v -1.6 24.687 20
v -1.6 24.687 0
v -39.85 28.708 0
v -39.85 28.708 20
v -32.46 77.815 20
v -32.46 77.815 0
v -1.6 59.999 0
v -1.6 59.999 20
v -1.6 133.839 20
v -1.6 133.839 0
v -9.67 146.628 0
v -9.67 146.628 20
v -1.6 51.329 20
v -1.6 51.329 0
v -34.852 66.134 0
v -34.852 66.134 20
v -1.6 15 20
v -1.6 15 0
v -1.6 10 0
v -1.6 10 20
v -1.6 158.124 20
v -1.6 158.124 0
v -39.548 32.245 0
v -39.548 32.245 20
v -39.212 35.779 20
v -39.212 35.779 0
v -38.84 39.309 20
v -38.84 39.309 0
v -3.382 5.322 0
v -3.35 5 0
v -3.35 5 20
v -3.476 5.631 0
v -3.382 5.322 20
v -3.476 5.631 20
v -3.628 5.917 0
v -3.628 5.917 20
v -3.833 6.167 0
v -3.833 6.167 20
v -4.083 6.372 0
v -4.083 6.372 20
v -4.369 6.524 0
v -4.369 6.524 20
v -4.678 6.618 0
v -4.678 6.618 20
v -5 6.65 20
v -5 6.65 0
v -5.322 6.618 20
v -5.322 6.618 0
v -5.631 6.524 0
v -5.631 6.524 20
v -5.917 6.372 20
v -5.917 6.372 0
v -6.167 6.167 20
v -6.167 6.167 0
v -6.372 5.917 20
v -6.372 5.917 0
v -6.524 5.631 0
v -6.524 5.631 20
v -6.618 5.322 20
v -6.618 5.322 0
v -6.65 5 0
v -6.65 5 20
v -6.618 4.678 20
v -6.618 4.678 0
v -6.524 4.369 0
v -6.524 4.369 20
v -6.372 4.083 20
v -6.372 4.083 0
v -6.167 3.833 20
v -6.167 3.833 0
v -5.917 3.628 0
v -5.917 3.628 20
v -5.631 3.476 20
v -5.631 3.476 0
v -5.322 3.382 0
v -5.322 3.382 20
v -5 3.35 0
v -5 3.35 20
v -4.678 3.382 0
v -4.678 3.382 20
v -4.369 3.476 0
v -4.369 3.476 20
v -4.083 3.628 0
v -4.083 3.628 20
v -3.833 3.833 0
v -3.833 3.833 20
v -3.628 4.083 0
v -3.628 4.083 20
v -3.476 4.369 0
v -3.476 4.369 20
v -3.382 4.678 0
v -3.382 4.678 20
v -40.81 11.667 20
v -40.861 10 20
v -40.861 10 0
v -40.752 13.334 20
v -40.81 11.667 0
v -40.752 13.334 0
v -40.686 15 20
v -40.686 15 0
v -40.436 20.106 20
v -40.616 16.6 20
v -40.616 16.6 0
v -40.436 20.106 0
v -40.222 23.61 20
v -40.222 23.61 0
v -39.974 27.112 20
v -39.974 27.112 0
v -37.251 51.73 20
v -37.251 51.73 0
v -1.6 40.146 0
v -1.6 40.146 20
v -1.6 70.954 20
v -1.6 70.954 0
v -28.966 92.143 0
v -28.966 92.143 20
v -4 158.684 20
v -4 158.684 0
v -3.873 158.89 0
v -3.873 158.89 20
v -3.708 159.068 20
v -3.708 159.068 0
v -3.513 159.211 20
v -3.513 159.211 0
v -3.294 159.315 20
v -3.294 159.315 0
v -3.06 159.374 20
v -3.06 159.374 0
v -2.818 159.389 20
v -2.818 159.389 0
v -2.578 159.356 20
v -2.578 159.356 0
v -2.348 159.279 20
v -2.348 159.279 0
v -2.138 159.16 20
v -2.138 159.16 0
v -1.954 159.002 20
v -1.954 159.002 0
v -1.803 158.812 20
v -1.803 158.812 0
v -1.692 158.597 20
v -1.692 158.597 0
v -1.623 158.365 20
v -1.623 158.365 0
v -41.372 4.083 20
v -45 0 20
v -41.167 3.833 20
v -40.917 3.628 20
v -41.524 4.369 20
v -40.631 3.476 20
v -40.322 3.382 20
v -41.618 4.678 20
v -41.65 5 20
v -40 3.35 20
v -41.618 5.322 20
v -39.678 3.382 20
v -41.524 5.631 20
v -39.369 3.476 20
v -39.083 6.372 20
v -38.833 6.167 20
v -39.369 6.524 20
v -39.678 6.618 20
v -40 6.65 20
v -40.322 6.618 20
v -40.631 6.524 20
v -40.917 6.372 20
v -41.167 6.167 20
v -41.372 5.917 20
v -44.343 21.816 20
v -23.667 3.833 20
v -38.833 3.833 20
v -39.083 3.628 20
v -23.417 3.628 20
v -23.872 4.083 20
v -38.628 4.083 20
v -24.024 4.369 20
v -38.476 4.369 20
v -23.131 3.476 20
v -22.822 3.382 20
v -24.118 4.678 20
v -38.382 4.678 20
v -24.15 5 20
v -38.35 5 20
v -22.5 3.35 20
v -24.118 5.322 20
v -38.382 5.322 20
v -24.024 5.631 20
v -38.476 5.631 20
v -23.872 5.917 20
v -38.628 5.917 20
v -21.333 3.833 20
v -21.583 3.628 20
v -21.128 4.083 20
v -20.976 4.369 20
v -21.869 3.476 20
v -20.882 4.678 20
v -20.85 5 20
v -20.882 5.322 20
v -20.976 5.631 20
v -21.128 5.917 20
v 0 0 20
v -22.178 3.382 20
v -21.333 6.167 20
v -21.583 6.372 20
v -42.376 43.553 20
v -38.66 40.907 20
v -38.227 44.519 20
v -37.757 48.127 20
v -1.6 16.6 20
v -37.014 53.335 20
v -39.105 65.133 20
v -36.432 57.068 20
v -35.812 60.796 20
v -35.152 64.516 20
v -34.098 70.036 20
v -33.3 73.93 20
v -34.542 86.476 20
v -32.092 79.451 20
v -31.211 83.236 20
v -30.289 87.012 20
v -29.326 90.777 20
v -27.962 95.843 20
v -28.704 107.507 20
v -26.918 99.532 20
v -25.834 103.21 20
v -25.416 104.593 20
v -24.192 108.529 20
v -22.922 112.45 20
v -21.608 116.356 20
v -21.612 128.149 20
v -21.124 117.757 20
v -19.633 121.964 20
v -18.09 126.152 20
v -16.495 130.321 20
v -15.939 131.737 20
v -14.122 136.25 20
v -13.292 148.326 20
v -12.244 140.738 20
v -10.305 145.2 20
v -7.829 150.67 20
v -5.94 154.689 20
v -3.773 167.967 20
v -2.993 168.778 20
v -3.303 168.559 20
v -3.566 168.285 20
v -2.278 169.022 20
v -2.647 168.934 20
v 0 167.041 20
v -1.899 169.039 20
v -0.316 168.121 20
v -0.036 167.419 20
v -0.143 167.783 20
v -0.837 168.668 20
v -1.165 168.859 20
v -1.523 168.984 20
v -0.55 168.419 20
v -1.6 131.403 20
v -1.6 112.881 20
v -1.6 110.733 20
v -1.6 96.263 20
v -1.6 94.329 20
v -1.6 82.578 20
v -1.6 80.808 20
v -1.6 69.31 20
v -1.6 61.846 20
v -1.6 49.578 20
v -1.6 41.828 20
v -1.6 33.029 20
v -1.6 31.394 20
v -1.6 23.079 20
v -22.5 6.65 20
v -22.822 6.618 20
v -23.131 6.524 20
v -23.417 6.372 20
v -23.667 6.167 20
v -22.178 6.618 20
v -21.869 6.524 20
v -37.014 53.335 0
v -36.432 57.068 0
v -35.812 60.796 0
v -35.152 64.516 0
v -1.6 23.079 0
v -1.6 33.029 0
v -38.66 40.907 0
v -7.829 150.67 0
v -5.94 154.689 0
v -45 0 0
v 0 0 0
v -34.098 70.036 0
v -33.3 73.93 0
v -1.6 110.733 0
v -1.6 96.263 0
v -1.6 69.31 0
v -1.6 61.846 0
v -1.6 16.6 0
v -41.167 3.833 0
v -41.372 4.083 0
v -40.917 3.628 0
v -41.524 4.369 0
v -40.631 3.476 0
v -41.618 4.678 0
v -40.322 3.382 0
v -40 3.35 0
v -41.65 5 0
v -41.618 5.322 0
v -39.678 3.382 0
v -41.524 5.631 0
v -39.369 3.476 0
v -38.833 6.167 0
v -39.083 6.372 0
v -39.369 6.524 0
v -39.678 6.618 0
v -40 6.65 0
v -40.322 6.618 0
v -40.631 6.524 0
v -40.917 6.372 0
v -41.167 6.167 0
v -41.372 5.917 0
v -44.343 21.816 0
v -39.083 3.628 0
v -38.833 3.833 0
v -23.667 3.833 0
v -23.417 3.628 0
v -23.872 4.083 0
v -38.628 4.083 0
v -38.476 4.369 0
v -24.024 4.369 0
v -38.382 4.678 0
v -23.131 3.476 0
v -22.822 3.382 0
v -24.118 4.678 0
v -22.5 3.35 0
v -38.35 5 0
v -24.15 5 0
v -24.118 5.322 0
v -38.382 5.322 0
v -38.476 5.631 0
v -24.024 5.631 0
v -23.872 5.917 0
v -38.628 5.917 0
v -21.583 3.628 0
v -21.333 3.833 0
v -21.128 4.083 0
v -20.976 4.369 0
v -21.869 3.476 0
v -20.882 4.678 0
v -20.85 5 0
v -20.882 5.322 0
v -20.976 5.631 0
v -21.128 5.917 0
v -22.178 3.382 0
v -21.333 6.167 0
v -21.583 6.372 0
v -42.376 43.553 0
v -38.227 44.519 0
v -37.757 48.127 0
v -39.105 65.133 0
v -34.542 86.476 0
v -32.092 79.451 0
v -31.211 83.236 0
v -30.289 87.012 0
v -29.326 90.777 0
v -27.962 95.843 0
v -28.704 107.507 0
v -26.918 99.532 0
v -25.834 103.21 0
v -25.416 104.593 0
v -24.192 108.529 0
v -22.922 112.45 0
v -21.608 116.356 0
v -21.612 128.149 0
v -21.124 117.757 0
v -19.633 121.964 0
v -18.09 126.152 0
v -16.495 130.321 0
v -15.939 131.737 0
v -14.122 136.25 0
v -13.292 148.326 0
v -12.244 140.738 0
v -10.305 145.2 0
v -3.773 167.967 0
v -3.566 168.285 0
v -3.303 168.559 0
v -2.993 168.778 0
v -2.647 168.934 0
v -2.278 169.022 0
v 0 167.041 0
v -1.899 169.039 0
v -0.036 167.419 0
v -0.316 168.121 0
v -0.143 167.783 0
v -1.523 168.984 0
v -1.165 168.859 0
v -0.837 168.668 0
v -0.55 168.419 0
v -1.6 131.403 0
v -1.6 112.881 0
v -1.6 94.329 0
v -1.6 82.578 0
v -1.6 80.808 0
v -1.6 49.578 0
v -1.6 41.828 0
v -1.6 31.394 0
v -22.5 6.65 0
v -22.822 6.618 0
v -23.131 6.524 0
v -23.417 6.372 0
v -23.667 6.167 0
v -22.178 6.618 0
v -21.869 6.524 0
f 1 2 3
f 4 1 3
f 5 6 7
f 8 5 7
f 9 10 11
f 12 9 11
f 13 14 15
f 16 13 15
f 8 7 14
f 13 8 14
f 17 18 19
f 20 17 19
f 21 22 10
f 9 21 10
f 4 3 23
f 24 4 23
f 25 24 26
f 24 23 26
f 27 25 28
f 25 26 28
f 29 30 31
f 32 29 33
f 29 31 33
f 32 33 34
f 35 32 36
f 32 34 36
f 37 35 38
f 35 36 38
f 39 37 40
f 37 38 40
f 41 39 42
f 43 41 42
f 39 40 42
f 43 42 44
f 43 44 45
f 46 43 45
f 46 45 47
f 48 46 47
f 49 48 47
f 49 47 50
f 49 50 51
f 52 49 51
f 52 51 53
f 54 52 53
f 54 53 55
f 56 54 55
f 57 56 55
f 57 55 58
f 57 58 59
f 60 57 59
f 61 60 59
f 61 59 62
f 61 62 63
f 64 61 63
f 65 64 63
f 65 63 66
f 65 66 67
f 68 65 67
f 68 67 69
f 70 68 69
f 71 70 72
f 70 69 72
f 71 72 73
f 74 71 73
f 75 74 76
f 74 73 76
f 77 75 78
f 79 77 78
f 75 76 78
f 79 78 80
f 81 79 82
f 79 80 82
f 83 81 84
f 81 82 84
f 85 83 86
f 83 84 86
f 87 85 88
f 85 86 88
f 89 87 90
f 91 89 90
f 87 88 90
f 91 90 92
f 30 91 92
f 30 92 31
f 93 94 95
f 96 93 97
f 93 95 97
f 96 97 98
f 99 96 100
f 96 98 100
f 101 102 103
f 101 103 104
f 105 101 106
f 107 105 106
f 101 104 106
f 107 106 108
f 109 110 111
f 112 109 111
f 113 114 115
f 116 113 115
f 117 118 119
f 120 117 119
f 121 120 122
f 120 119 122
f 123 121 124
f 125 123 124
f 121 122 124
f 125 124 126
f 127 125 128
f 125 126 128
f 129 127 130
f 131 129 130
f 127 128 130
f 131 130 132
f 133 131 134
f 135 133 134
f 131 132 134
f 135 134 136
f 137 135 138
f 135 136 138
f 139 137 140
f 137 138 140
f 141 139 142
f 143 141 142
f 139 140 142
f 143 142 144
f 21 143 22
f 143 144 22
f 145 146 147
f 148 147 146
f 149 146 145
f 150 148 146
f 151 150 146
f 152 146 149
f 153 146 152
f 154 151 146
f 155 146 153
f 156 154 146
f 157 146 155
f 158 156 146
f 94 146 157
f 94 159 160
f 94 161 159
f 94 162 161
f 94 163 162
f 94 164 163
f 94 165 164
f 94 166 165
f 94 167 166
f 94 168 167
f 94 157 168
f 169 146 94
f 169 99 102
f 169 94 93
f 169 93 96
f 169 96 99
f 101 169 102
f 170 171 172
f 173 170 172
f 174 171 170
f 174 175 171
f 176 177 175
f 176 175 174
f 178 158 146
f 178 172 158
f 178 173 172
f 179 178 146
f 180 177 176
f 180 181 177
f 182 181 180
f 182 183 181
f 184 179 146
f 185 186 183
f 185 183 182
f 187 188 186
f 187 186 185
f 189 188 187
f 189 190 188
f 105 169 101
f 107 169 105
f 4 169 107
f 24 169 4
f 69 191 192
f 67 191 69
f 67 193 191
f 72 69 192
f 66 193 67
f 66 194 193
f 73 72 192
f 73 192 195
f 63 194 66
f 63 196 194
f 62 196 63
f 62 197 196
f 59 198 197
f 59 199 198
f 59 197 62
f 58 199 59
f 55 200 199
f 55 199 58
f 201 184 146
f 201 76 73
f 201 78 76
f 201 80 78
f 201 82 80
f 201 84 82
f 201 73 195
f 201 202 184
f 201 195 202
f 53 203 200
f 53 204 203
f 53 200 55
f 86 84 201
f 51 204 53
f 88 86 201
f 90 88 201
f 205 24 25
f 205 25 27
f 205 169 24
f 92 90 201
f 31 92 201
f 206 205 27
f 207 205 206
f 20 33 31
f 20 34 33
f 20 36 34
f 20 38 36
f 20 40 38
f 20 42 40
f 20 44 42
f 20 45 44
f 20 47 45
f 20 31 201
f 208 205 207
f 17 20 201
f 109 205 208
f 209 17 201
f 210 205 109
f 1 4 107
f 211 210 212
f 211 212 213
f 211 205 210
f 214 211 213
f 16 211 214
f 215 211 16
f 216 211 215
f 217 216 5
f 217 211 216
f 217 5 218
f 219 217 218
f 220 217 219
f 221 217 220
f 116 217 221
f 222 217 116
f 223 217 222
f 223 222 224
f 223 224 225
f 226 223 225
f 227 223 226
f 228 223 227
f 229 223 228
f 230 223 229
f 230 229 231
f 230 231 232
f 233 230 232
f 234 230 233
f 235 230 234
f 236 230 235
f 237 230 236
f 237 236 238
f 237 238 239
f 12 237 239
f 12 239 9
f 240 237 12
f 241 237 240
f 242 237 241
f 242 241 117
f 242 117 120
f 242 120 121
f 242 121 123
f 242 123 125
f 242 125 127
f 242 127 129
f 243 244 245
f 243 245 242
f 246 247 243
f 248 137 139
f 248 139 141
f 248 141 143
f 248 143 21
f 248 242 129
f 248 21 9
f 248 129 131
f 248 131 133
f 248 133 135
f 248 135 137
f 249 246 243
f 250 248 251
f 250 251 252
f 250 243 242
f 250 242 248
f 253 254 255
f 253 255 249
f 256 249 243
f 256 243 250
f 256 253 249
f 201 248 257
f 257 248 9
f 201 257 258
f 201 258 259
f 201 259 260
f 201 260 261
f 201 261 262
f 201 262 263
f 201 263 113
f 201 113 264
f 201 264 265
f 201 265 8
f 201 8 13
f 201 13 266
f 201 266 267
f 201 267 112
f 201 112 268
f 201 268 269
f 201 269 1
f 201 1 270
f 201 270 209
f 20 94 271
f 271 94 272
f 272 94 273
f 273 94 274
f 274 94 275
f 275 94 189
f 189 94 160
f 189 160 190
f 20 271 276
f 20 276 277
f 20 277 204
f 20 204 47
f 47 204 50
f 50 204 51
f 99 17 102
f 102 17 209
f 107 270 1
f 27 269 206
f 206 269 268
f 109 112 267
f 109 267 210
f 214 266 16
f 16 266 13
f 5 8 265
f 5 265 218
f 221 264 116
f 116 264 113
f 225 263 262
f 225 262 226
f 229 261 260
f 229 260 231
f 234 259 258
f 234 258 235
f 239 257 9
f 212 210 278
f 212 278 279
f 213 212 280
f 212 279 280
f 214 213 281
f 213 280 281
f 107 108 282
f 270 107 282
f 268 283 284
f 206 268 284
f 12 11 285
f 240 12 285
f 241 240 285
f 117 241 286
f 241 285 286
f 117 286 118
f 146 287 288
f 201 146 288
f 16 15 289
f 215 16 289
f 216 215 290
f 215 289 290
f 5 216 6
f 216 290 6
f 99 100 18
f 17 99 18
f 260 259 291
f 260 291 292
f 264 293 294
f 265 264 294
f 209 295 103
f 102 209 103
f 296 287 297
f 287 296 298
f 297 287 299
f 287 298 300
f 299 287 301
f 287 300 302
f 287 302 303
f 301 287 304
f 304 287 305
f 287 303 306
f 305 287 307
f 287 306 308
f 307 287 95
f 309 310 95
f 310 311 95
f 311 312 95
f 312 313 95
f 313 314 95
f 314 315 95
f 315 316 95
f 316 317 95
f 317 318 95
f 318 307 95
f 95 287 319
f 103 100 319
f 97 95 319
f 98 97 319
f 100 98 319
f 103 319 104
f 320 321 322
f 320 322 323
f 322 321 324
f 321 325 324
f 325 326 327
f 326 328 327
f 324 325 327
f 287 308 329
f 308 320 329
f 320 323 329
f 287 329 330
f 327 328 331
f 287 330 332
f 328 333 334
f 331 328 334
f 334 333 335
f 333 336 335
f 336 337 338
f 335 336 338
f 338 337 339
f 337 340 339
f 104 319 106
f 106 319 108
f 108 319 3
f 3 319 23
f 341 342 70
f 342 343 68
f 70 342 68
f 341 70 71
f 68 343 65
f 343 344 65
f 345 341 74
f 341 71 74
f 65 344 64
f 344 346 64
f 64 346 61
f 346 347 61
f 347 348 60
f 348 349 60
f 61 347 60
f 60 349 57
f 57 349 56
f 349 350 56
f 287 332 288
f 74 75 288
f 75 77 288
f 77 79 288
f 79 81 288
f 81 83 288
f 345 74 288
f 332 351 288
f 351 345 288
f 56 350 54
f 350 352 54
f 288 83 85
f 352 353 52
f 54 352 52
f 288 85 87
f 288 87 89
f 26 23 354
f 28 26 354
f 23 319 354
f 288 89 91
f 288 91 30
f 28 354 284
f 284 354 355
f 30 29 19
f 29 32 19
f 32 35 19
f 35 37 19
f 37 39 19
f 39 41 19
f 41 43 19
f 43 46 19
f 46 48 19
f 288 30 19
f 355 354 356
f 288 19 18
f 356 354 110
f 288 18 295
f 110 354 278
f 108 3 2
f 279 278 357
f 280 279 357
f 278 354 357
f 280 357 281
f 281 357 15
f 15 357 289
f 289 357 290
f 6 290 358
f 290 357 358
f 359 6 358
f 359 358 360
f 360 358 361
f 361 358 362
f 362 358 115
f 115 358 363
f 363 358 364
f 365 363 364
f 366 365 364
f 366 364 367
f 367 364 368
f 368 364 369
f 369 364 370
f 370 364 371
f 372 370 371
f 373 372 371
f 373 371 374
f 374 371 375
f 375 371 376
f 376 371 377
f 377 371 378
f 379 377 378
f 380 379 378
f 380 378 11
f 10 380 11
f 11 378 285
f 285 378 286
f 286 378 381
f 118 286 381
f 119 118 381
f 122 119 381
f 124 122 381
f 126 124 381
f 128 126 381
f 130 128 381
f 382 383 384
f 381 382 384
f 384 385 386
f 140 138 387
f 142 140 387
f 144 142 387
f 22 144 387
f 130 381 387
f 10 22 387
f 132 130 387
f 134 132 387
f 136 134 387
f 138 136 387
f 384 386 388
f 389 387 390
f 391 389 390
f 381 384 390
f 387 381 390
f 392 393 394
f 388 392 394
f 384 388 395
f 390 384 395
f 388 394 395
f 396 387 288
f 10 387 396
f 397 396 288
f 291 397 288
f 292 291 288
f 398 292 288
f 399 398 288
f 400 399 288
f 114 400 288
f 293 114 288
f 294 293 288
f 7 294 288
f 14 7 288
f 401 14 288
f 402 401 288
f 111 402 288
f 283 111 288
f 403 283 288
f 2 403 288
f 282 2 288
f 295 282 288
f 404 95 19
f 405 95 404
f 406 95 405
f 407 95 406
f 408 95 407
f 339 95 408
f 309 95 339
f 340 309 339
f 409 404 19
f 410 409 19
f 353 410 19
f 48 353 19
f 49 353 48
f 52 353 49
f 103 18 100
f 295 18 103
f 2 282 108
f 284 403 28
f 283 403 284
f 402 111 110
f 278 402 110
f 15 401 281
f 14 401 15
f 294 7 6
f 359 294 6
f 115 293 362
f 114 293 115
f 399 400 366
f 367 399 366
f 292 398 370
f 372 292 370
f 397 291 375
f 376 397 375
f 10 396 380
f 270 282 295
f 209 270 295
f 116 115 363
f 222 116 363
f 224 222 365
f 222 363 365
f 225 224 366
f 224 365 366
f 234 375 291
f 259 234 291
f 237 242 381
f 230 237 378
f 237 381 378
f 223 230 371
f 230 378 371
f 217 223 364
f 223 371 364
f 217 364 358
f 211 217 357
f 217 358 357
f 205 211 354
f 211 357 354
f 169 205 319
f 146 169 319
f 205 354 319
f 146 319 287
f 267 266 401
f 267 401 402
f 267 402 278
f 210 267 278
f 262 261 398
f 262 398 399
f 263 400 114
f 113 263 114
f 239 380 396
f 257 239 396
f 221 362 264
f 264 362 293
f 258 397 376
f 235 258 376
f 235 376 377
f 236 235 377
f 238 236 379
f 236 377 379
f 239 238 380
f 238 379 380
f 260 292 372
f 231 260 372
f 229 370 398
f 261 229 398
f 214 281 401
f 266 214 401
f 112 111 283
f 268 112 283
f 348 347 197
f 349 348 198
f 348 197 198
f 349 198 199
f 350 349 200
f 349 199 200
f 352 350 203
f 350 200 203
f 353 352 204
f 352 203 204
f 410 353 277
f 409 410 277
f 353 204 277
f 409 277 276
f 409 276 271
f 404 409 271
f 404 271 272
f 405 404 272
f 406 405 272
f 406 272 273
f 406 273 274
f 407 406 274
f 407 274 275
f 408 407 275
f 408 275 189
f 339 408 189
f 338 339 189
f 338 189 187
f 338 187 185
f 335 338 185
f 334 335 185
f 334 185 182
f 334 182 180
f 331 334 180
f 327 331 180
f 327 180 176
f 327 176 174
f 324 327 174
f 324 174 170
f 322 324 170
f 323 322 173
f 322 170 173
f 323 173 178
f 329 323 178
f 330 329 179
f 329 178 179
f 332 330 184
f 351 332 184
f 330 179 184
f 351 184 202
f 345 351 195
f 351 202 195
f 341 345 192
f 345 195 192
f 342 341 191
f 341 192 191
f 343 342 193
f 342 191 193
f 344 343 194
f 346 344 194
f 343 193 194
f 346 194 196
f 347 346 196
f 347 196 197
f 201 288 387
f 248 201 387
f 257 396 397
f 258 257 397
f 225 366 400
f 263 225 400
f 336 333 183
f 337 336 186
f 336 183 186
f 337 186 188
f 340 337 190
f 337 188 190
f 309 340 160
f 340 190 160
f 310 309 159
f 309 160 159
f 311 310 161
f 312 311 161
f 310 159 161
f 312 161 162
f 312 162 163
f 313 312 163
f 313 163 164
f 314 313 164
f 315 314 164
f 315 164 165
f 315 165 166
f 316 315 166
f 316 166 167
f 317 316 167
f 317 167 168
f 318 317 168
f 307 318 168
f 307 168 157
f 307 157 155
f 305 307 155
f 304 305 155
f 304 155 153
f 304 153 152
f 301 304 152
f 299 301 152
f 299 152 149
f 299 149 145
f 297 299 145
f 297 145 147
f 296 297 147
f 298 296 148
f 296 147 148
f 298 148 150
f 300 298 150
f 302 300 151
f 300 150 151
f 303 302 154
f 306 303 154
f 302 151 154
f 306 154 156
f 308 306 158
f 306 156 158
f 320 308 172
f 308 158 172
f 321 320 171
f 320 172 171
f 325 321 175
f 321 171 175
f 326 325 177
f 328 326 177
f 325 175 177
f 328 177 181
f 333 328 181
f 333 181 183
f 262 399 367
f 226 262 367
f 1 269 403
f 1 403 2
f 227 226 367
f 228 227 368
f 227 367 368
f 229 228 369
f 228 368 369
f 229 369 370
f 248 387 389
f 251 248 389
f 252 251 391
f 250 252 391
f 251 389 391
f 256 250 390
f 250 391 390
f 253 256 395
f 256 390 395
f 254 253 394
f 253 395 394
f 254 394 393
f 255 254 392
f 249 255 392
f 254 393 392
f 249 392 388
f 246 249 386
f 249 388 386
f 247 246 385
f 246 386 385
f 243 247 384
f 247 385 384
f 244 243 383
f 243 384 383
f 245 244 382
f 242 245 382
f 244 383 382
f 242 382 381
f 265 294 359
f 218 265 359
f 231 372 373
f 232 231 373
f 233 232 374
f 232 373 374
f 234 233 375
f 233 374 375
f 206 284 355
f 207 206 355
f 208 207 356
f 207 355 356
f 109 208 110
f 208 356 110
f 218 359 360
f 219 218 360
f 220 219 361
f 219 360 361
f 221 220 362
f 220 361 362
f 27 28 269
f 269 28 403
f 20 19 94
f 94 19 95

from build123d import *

# Parameters (mm, degrees)
BOSS_EXTRUDE4_DEPTH = 20
BOSS_EXTRUDE7_START = -20
BOSS_EXTRUDE7_DEPTH = 20
SKETCH12_R          = 1.65
CUT_EXTRUDE1_DEPTH  = 177.068006068


with BuildPart() as part:
    # Sketch5 → Boss-Extrude4 (new body)
    with BuildSketch(Plane.XY):
        with BuildLine():
            Line((0, 0), (0, 167.041245738))
            ThreePointArc((0, 167.041245738), (-1.523254023, 168.9835931), (-3.772713274, 167.967252028))
            ThreePointArc((-3.772713274, 167.967252028), (-34.542452011, 86.476422979), (-45, 0))
            Line((-45, 0), (0, 0))
        make_face()
        with BuildLine():
            Line((-1.6, 10), (-40.860610891, 10))
            ThreePointArc((-40.860610891, 10), (-30.458147518, 86.332115465), (-4, 158.683822602))
            ThreePointArc((-4, 158.683822602), (-2.577933762, 159.356407939), (-1.6, 158.124219244))
            Line((-1.6, 158.124219244), (-1.6, 10))
        make_face(mode=Mode.SUBTRACT)
    extrude(amount=BOSS_EXTRUDE4_DEPTH)

    # Sketch11 → Boss-Extrude7 (add)
    with BuildSketch(Plane.XY.offset(20).offset(BOSS_EXTRUDE7_START)):
        with BuildLine():
            ThreePointArc((-40.61576824, 16.6), (-40.651926046, 15.800039355), (-40.686298284, 15))
            Line((-40.686298284, 15), (-1.6, 15))
            Line((-1.6, 15), (-1.6, 16.6))
            Line((-1.6, 16.6), (-40.61576824, 16.6))
        make_face()
        with BuildLine():
            ThreePointArc((-39.849641566, 28.707538392), (-39.912786801, 27.909744506), (-39.974152323, 27.111811753))
            Line((-39.974152323, 27.111811753), (-1.6, 23.078525819))
            Line((-1.6, 23.078525819), (-1.6, 24.687339066))
            Line((-1.6, 24.687339066), (-39.849641566, 28.707538392))
        make_face()
        with BuildLine():
            ThreePointArc((-38.660345477, 40.906700159), (-38.751098874, 40.10802838), (-38.840062688, 39.30915528))
            Line((-38.840062688, 39.30915528), (-1.6, 31.393535598))
            Line((-1.6, 31.393535598), (-1.6, 33.02928055))
            Line((-1.6, 33.02928055), (-38.660345477, 40.906700159))
        make_face()
        with BuildLine():
            ThreePointArc((-37.013521794, 53.335050155), (-37.133222882, 52.532613088), (-37.251109088, 51.729907388))
            Line((-37.251109088, 51.729907388), (-1.6, 40.146159853))
            Line((-1.6, 40.146159853), (-1.6, 41.828499411))
            Line((-1.6, 41.828499411), (-37.013521794, 53.335050155))
        make_face()
        with BuildLine():
            ThreePointArc((-34.852060307, 66.133887827), (-35.002794049, 65.325048554), (-35.151672531, 64.515865738))
            Line((-35.151672531, 64.515865738), (-1.6, 49.577698687))
            Line((-1.6, 49.577698687), (-1.6, 51.329116733))
            Line((-1.6, 51.329116733), (-34.852060307, 66.133887827))
        make_face()
        with BuildLine():
            ThreePointArc((-32.092292656, 79.450787546), (-32.27693125, 78.633291388), (-32.45965971, 77.815366152))
            Line((-32.45965971, 77.815366152), (-1.6, 59.998533312))
            Line((-1.6, 59.998533312), (-1.6, 61.846054173))
            Line((-1.6, 61.846054173), (-32.092292656, 79.450787546))
        make_face()
        with BuildLine():
            ThreePointArc((-28.966005847, 92.142511062), (-29.146660506, 91.459980039), (-29.325971671, 90.77709483))
            Line((-29.325971671, 90.77709483), (-1.6, 69.30954071))
            Line((-1.6, 69.30954071), (-1.6, 70.953669837))
            Line((-1.6, 70.953669837), (-28.966005847, 92.142511062))
        make_face()
        with BuildLine():
            ThreePointArc((-25.415771616, 104.592932273), (-25.62575353, 103.901436527), (-25.834342161, 103.209519225))
            Line((-25.834342161, 103.209519225), (-1.6, 80.807713123))
            Line((-1.6, 80.807713123), (-1.6, 82.578045531))
            Line((-1.6, 82.578045531), (-25.415771616, 104.592932273))
        make_face()
        with BuildLine():
            ThreePointArc((-21.12443405, 117.757312491), (-21.366950886, 117.057023911), (-21.608020686, 116.356235882))
            Line((-21.608020686, 116.356235882), (-1.6, 94.329309417))
            Line((-1.6, 94.329309417), (-1.6, 96.262768885))
            Line((-1.6, 96.262768885), (-21.12443405, 117.757312491))
        make_face()
        with BuildLine():
            ThreePointArc((-15.938835517, 131.737298585), (-16.21749388, 131.029204139), (-16.49464978, 130.320520265))
            Line((-16.49464978, 130.320520265), (-1.6, 110.733232757))
            Line((-1.6, 110.733232757), (-1.6, 112.880937546))
            Line((-1.6, 112.880937546), (-15.938835517, 131.737298585))
        make_face()
        with BuildLine():
            ThreePointArc((-9.669507991, 146.627994836), (-9.988229593, 145.91414681), (-10.30539498, 145.199605992))
            Line((-10.30539498, 145.199605992), (-1.6, 131.402518814))
            Line((-1.6, 131.402518814), (-1.6, 133.83871813))
            Line((-1.6, 133.83871813), (-9.669507991, 146.627994836))
        make_face()
    extrude(amount=BOSS_EXTRUDE7_DEPTH)

    # Sketch12 → Cut-Extrude1 (cut, through all)
    with BuildSketch(Plane.XY.offset(20)):
        with Locations((-40, 5)):
            Circle(SKETCH12_R)
        with Locations((-22.5, 5)):
            Circle(SKETCH12_R)
        with Locations((-5, 5)):
            Circle(SKETCH12_R)
    extrude(amount=-CUT_EXTRUDE1_DEPTH, mode=Mode.SUBTRACT)


solid = part.part
